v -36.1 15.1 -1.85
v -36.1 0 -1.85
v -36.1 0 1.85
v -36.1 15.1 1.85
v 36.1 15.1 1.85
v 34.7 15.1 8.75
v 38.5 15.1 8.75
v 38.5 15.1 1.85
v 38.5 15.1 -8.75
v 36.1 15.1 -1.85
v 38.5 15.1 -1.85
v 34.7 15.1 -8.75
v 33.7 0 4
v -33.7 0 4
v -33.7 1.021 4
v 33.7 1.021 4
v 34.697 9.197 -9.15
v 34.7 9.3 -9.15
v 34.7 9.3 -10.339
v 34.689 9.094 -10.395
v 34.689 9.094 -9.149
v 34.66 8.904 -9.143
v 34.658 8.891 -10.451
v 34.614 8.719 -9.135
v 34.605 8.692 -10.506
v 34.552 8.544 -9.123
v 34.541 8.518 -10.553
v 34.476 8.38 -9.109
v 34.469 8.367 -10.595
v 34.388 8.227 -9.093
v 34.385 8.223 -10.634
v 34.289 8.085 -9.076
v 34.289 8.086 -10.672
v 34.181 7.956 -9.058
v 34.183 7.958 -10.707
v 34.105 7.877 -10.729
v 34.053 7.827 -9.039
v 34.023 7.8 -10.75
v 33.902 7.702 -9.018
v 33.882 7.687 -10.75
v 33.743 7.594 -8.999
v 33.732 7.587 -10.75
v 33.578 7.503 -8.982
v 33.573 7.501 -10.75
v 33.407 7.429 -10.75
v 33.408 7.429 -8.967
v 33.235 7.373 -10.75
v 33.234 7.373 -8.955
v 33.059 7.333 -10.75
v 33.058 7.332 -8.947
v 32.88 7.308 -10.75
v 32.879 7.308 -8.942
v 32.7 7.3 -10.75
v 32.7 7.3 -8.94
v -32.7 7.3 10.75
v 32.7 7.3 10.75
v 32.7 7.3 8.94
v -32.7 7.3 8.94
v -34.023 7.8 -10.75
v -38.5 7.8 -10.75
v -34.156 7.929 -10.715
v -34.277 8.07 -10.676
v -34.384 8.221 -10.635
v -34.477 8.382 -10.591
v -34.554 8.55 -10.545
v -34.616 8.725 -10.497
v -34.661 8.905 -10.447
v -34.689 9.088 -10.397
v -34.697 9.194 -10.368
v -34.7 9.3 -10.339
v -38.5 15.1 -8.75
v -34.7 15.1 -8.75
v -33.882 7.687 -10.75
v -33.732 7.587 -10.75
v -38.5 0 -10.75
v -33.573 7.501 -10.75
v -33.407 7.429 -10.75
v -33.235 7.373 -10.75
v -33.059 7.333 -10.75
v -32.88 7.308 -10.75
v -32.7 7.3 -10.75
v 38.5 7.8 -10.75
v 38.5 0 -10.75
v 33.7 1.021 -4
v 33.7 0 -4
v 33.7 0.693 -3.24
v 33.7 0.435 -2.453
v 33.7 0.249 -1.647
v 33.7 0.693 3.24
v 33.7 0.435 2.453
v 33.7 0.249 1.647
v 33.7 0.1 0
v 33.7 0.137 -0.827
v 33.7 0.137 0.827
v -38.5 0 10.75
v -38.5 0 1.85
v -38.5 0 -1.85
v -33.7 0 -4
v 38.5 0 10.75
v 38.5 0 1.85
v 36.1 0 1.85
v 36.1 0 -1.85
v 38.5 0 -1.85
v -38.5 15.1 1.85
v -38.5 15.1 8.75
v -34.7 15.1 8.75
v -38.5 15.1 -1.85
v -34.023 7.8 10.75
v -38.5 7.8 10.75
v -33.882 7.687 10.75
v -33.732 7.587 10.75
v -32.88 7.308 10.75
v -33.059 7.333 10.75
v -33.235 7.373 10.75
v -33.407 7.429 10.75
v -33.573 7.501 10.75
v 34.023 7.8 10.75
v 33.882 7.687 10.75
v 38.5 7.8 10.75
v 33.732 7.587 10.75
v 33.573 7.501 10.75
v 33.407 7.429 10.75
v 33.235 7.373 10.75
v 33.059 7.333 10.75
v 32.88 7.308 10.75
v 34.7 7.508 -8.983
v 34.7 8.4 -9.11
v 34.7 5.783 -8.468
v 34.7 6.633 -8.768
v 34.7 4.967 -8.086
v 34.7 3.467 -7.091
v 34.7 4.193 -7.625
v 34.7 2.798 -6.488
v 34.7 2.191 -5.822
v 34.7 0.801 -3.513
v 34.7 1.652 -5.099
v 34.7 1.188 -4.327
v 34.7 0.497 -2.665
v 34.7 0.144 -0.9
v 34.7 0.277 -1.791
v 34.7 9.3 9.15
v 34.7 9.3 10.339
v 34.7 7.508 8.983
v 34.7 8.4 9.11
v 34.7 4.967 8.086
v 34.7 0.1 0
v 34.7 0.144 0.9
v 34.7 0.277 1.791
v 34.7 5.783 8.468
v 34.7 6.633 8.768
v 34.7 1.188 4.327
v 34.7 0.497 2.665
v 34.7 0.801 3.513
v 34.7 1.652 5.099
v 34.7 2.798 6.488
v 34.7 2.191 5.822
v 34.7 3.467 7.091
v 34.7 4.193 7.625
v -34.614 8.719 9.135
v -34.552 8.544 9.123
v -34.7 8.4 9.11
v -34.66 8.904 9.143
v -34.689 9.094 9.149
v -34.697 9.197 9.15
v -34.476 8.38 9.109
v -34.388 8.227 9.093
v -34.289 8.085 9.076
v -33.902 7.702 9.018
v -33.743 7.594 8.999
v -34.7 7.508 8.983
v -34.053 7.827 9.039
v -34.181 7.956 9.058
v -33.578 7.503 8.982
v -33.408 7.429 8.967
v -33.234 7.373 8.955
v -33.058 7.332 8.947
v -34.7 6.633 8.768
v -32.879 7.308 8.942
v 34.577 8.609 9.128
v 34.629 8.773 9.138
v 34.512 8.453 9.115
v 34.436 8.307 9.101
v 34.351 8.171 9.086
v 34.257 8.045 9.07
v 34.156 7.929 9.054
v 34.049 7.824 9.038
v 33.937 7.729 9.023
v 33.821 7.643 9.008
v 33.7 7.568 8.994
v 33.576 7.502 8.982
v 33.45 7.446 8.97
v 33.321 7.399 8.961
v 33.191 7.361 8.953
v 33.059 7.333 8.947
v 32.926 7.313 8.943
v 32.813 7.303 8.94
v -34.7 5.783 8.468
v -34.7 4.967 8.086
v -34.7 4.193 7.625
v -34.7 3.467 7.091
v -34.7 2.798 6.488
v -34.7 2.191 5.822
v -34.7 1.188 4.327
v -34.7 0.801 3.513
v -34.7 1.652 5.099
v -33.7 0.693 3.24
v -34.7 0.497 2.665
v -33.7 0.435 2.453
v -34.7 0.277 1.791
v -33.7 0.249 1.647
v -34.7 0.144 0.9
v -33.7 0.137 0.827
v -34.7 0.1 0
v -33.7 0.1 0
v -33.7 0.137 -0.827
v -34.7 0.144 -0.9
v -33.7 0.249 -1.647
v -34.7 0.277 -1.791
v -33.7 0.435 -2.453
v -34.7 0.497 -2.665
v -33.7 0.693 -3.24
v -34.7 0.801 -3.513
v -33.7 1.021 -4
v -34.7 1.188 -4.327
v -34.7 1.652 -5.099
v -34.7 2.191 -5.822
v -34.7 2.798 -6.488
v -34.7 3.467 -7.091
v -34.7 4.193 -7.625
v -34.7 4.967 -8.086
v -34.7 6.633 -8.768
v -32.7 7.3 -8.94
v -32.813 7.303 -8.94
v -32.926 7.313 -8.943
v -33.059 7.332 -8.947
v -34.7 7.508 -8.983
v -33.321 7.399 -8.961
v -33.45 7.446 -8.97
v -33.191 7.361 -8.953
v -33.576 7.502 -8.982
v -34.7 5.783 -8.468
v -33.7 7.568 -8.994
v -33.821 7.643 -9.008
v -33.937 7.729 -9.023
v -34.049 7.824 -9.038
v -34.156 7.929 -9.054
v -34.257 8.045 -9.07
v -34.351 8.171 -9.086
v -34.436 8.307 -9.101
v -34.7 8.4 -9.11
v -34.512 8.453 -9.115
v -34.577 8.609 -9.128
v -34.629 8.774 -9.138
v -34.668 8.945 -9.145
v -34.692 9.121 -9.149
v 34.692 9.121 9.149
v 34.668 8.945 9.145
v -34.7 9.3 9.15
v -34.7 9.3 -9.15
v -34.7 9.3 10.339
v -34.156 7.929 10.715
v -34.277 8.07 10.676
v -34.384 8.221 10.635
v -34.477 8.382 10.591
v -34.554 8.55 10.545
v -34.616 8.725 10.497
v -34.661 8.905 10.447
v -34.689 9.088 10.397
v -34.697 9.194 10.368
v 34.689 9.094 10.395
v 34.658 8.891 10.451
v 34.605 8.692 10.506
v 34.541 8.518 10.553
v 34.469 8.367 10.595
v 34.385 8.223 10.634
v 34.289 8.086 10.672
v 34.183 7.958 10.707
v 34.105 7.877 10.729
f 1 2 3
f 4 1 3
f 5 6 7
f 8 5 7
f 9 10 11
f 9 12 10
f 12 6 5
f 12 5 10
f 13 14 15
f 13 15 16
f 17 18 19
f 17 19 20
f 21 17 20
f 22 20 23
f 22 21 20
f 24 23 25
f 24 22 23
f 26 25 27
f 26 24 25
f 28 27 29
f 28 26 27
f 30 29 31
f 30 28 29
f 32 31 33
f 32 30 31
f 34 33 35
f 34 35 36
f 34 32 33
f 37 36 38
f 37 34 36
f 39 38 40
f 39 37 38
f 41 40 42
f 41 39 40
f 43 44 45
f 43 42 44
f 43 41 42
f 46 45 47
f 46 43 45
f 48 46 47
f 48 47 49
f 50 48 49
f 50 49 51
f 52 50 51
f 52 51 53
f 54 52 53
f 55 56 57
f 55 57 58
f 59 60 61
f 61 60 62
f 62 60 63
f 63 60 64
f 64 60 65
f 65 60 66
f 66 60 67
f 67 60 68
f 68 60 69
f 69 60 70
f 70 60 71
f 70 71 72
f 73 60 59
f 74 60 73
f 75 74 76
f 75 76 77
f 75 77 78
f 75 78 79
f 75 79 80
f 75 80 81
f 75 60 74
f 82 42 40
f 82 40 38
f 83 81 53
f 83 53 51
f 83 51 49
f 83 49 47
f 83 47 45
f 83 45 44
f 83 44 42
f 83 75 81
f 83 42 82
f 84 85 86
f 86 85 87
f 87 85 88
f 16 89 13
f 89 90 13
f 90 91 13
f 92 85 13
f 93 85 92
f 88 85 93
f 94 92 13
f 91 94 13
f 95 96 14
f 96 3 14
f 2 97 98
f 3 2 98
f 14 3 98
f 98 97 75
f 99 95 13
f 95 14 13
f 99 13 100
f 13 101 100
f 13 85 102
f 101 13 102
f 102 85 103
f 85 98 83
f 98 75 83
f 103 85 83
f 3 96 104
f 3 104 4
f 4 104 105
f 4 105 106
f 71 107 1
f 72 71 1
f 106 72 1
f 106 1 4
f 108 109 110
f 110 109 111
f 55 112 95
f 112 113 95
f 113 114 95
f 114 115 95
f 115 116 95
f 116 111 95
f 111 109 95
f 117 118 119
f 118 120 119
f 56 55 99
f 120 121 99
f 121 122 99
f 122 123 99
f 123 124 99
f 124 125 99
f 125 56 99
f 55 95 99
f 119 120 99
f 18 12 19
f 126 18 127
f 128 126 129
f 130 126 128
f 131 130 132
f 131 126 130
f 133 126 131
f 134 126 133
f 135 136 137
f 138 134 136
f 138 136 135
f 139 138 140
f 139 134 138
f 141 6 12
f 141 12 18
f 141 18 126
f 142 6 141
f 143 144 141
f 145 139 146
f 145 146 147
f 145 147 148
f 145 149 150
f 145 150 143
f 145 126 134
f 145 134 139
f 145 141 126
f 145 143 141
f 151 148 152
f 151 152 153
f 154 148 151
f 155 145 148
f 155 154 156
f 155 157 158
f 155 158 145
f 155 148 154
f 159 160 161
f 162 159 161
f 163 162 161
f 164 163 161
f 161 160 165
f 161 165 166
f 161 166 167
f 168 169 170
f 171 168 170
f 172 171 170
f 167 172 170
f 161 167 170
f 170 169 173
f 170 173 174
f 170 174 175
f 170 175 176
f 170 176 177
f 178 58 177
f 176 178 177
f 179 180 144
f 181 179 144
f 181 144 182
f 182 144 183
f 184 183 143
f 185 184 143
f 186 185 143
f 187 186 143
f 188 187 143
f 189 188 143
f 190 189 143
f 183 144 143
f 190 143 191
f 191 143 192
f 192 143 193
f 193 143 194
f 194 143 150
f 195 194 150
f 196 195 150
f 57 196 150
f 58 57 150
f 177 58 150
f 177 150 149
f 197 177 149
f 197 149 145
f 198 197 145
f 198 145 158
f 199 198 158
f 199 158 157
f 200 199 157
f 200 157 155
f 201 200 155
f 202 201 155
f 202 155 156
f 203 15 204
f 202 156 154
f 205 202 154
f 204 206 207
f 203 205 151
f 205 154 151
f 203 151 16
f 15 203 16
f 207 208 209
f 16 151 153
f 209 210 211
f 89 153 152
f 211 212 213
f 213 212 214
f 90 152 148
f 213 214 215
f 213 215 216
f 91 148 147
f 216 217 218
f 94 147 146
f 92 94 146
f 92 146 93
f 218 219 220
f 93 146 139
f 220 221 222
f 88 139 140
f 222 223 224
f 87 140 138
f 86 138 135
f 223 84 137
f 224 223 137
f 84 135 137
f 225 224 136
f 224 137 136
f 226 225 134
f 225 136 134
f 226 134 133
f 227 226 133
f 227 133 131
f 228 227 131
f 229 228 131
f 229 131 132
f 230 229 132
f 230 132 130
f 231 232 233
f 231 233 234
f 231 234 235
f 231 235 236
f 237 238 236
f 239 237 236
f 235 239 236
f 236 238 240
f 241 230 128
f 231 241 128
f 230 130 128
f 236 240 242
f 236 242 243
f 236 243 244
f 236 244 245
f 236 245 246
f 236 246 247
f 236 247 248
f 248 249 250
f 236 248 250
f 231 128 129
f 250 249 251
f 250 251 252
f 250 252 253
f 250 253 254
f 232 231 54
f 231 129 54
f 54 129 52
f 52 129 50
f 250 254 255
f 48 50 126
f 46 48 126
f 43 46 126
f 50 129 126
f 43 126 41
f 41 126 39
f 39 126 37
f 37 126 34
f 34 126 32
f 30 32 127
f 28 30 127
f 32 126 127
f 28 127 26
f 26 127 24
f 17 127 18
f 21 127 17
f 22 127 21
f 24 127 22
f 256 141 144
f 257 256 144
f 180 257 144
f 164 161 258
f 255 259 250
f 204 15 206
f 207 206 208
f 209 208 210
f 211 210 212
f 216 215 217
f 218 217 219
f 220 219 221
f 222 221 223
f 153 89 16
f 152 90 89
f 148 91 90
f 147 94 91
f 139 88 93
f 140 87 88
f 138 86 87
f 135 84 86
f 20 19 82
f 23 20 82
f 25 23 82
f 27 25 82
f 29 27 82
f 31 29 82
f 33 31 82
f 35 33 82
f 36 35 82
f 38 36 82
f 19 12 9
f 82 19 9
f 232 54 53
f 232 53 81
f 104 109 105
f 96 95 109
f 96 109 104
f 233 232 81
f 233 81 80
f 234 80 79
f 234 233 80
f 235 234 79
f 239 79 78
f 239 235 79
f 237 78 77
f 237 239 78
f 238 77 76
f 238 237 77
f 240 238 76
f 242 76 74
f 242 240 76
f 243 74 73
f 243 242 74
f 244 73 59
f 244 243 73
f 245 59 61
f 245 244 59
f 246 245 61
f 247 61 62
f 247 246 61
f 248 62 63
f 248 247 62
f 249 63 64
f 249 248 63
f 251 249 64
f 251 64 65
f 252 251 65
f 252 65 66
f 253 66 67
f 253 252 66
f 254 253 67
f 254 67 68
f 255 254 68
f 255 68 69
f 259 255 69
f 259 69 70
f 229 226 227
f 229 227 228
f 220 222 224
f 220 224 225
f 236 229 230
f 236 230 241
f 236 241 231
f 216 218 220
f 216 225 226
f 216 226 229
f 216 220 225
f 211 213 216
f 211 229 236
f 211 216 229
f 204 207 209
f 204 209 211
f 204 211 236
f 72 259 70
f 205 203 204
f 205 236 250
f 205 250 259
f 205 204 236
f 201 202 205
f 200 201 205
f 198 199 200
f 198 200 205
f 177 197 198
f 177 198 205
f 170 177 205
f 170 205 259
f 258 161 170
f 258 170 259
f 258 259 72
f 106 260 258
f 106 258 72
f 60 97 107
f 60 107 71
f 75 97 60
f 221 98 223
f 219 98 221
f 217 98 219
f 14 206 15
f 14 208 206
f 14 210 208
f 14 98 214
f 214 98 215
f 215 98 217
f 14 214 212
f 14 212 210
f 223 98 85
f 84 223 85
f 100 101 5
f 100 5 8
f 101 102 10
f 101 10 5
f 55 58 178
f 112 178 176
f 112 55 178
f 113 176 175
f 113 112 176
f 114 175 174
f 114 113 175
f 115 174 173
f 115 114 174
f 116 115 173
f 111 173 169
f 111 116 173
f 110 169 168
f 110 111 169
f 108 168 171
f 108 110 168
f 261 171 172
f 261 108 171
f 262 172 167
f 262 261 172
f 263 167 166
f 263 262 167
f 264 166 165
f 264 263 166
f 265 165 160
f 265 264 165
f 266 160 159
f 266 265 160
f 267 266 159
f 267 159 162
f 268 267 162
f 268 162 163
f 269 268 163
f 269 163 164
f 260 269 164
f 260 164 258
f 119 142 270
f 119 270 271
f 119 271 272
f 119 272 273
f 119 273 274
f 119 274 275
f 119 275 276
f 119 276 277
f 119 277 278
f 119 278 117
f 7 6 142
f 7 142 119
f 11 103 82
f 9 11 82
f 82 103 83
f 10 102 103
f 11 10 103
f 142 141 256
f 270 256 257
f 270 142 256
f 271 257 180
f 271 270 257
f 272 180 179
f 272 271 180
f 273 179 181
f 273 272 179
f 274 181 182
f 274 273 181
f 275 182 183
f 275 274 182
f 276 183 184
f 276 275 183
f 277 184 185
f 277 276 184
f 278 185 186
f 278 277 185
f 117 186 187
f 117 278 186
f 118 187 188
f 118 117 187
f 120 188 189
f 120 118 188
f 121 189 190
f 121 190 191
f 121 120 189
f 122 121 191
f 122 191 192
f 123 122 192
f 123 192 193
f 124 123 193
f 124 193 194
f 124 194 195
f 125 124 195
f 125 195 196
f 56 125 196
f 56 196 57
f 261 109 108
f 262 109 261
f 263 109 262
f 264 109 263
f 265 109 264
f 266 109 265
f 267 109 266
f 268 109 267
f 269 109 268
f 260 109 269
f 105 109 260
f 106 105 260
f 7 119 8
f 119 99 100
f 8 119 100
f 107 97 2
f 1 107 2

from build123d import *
from OCP.BRepFilletAPI import BRepFilletAPI_MakeChamfer

# Parameters (mm, degrees)
SKETCH_1_W          = 77
SKETCH_1_H          = 21.5
EXTRUDE_1_DEPTH     = 15.1
CHAMFER_1_SIZE      = 7.3
CHAMFER_1_SIZE2     = 2
CUT_EXTRUDE_1_DEPTH = 47.610192018
CUT_EXTRUDE_START   = -3.8
SKETCH_3_R          = 9.15
CUT_EXTRUDE_2_DEPTH = 69.4
SKETCH_4_W          = 67.4
SKETCH_4_H          = 8
SKETCH_4_W_2        = 2.4
SKETCH_4_H_2        = 3.7
CUT_EXTRUDE_3_DEPTH = 43.729644302


with BuildPart() as part:
    # Эскиз1 → Бобышка-Вытянуть1 (new body)
    with BuildSketch(Plane(origin=(0, 0, 0), x_dir=(1, 0, 0), z_dir=(0, 1, 0))):
        Rectangle(SKETCH_1_W, SKETCH_1_H)
    extrude(amount=EXTRUDE_1_DEPTH)

    # Фаска1: one chamfer whose edges measure the first distance from different faces: ONE call of the kernel's chamfer builder (chamfer() names one face for all edges)
    chamfer_1_edges_1 = [part.edges().sort_by_distance(p)[0] for p in [
        (0, 15.1, 10.75),
    ]]
    chamfer_1_side_1 = [part.faces().sort_by_distance(p)[0] for p in [
        (0, 7.55, 10.75),
    ]]
    chamfer_1_edges_2 = [part.edges().sort_by_distance(p)[0] for p in [
        (0, 15.1, -10.75),
    ]]
    chamfer_1_side_2 = [part.faces().sort_by_distance(p)[0] for p in [
        (0, 7.55, -10.75),
    ]]
    chamfer_1 = BRepFilletAPI_MakeChamfer(part.part.solid().wrapped)
    for e in chamfer_1_edges_1:
        chamfer_1.Add(CHAMFER_1_SIZE, CHAMFER_1_SIZE2, e.wrapped, chamfer_1_side_1[0].wrapped)  # the first distance lies on this face
    for e in chamfer_1_edges_2:
        chamfer_1.Add(CHAMFER_1_SIZE, CHAMFER_1_SIZE2, e.wrapped, chamfer_1_side_2[0].wrapped)  # the first distance lies on this face
    add(Compound.cast(chamfer_1.Shape()), mode=Mode.REPLACE)

    # Эскиз2 → Вырез-Вытянуть1 (cut, through all)
    with BuildSketch(Plane.XY.offset(10.75)):
        with BuildLine():
            Line((-34.7, 15.1), (34.7, 15.1))
            Line((34.7, 15.1), (34.7, 9.3))
            ThreePointArc((34.7, 9.3), (34.114213562, 7.885786438), (32.7, 7.3))
            Line((32.7, 7.3), (-32.7, 7.3))
            ThreePointArc((-32.7, 7.3), (-34.114213562, 7.885786438), (-34.7, 9.3))
            Line((-34.7, 9.3), (-34.7, 15.1))
        make_face()
    extrude(amount=-CUT_EXTRUDE_1_DEPTH, mode=Mode.SUBTRACT)

    # Эскиз3 → Вырез-Вытянуть2 (cut)
    with BuildSketch(Plane(origin=(38.5, 0, 0), x_dir=(0, 0, -1), z_dir=(1, 0, 0)).offset(CUT_EXTRUDE_START)):
        with Locations((0, 9.25)):
            Circle(SKETCH_3_R)
    extrude(amount=-CUT_EXTRUDE_2_DEPTH, mode=Mode.SUBTRACT)

    # Эскиз4 → Вырез-Вытянуть3 (cut, through all)
    with BuildSketch(Plane.XZ):
        Rectangle(SKETCH_4_W, SKETCH_4_H)
        with Locations((-37.3, 0)):
            Rectangle(SKETCH_4_W_2, SKETCH_4_H_2)
        with Locations((37.3, 0)):
            Rectangle(SKETCH_4_W_2, SKETCH_4_H_2)
    extrude(amount=-CUT_EXTRUDE_3_DEPTH, mode=Mode.SUBTRACT)


solid = part.part
